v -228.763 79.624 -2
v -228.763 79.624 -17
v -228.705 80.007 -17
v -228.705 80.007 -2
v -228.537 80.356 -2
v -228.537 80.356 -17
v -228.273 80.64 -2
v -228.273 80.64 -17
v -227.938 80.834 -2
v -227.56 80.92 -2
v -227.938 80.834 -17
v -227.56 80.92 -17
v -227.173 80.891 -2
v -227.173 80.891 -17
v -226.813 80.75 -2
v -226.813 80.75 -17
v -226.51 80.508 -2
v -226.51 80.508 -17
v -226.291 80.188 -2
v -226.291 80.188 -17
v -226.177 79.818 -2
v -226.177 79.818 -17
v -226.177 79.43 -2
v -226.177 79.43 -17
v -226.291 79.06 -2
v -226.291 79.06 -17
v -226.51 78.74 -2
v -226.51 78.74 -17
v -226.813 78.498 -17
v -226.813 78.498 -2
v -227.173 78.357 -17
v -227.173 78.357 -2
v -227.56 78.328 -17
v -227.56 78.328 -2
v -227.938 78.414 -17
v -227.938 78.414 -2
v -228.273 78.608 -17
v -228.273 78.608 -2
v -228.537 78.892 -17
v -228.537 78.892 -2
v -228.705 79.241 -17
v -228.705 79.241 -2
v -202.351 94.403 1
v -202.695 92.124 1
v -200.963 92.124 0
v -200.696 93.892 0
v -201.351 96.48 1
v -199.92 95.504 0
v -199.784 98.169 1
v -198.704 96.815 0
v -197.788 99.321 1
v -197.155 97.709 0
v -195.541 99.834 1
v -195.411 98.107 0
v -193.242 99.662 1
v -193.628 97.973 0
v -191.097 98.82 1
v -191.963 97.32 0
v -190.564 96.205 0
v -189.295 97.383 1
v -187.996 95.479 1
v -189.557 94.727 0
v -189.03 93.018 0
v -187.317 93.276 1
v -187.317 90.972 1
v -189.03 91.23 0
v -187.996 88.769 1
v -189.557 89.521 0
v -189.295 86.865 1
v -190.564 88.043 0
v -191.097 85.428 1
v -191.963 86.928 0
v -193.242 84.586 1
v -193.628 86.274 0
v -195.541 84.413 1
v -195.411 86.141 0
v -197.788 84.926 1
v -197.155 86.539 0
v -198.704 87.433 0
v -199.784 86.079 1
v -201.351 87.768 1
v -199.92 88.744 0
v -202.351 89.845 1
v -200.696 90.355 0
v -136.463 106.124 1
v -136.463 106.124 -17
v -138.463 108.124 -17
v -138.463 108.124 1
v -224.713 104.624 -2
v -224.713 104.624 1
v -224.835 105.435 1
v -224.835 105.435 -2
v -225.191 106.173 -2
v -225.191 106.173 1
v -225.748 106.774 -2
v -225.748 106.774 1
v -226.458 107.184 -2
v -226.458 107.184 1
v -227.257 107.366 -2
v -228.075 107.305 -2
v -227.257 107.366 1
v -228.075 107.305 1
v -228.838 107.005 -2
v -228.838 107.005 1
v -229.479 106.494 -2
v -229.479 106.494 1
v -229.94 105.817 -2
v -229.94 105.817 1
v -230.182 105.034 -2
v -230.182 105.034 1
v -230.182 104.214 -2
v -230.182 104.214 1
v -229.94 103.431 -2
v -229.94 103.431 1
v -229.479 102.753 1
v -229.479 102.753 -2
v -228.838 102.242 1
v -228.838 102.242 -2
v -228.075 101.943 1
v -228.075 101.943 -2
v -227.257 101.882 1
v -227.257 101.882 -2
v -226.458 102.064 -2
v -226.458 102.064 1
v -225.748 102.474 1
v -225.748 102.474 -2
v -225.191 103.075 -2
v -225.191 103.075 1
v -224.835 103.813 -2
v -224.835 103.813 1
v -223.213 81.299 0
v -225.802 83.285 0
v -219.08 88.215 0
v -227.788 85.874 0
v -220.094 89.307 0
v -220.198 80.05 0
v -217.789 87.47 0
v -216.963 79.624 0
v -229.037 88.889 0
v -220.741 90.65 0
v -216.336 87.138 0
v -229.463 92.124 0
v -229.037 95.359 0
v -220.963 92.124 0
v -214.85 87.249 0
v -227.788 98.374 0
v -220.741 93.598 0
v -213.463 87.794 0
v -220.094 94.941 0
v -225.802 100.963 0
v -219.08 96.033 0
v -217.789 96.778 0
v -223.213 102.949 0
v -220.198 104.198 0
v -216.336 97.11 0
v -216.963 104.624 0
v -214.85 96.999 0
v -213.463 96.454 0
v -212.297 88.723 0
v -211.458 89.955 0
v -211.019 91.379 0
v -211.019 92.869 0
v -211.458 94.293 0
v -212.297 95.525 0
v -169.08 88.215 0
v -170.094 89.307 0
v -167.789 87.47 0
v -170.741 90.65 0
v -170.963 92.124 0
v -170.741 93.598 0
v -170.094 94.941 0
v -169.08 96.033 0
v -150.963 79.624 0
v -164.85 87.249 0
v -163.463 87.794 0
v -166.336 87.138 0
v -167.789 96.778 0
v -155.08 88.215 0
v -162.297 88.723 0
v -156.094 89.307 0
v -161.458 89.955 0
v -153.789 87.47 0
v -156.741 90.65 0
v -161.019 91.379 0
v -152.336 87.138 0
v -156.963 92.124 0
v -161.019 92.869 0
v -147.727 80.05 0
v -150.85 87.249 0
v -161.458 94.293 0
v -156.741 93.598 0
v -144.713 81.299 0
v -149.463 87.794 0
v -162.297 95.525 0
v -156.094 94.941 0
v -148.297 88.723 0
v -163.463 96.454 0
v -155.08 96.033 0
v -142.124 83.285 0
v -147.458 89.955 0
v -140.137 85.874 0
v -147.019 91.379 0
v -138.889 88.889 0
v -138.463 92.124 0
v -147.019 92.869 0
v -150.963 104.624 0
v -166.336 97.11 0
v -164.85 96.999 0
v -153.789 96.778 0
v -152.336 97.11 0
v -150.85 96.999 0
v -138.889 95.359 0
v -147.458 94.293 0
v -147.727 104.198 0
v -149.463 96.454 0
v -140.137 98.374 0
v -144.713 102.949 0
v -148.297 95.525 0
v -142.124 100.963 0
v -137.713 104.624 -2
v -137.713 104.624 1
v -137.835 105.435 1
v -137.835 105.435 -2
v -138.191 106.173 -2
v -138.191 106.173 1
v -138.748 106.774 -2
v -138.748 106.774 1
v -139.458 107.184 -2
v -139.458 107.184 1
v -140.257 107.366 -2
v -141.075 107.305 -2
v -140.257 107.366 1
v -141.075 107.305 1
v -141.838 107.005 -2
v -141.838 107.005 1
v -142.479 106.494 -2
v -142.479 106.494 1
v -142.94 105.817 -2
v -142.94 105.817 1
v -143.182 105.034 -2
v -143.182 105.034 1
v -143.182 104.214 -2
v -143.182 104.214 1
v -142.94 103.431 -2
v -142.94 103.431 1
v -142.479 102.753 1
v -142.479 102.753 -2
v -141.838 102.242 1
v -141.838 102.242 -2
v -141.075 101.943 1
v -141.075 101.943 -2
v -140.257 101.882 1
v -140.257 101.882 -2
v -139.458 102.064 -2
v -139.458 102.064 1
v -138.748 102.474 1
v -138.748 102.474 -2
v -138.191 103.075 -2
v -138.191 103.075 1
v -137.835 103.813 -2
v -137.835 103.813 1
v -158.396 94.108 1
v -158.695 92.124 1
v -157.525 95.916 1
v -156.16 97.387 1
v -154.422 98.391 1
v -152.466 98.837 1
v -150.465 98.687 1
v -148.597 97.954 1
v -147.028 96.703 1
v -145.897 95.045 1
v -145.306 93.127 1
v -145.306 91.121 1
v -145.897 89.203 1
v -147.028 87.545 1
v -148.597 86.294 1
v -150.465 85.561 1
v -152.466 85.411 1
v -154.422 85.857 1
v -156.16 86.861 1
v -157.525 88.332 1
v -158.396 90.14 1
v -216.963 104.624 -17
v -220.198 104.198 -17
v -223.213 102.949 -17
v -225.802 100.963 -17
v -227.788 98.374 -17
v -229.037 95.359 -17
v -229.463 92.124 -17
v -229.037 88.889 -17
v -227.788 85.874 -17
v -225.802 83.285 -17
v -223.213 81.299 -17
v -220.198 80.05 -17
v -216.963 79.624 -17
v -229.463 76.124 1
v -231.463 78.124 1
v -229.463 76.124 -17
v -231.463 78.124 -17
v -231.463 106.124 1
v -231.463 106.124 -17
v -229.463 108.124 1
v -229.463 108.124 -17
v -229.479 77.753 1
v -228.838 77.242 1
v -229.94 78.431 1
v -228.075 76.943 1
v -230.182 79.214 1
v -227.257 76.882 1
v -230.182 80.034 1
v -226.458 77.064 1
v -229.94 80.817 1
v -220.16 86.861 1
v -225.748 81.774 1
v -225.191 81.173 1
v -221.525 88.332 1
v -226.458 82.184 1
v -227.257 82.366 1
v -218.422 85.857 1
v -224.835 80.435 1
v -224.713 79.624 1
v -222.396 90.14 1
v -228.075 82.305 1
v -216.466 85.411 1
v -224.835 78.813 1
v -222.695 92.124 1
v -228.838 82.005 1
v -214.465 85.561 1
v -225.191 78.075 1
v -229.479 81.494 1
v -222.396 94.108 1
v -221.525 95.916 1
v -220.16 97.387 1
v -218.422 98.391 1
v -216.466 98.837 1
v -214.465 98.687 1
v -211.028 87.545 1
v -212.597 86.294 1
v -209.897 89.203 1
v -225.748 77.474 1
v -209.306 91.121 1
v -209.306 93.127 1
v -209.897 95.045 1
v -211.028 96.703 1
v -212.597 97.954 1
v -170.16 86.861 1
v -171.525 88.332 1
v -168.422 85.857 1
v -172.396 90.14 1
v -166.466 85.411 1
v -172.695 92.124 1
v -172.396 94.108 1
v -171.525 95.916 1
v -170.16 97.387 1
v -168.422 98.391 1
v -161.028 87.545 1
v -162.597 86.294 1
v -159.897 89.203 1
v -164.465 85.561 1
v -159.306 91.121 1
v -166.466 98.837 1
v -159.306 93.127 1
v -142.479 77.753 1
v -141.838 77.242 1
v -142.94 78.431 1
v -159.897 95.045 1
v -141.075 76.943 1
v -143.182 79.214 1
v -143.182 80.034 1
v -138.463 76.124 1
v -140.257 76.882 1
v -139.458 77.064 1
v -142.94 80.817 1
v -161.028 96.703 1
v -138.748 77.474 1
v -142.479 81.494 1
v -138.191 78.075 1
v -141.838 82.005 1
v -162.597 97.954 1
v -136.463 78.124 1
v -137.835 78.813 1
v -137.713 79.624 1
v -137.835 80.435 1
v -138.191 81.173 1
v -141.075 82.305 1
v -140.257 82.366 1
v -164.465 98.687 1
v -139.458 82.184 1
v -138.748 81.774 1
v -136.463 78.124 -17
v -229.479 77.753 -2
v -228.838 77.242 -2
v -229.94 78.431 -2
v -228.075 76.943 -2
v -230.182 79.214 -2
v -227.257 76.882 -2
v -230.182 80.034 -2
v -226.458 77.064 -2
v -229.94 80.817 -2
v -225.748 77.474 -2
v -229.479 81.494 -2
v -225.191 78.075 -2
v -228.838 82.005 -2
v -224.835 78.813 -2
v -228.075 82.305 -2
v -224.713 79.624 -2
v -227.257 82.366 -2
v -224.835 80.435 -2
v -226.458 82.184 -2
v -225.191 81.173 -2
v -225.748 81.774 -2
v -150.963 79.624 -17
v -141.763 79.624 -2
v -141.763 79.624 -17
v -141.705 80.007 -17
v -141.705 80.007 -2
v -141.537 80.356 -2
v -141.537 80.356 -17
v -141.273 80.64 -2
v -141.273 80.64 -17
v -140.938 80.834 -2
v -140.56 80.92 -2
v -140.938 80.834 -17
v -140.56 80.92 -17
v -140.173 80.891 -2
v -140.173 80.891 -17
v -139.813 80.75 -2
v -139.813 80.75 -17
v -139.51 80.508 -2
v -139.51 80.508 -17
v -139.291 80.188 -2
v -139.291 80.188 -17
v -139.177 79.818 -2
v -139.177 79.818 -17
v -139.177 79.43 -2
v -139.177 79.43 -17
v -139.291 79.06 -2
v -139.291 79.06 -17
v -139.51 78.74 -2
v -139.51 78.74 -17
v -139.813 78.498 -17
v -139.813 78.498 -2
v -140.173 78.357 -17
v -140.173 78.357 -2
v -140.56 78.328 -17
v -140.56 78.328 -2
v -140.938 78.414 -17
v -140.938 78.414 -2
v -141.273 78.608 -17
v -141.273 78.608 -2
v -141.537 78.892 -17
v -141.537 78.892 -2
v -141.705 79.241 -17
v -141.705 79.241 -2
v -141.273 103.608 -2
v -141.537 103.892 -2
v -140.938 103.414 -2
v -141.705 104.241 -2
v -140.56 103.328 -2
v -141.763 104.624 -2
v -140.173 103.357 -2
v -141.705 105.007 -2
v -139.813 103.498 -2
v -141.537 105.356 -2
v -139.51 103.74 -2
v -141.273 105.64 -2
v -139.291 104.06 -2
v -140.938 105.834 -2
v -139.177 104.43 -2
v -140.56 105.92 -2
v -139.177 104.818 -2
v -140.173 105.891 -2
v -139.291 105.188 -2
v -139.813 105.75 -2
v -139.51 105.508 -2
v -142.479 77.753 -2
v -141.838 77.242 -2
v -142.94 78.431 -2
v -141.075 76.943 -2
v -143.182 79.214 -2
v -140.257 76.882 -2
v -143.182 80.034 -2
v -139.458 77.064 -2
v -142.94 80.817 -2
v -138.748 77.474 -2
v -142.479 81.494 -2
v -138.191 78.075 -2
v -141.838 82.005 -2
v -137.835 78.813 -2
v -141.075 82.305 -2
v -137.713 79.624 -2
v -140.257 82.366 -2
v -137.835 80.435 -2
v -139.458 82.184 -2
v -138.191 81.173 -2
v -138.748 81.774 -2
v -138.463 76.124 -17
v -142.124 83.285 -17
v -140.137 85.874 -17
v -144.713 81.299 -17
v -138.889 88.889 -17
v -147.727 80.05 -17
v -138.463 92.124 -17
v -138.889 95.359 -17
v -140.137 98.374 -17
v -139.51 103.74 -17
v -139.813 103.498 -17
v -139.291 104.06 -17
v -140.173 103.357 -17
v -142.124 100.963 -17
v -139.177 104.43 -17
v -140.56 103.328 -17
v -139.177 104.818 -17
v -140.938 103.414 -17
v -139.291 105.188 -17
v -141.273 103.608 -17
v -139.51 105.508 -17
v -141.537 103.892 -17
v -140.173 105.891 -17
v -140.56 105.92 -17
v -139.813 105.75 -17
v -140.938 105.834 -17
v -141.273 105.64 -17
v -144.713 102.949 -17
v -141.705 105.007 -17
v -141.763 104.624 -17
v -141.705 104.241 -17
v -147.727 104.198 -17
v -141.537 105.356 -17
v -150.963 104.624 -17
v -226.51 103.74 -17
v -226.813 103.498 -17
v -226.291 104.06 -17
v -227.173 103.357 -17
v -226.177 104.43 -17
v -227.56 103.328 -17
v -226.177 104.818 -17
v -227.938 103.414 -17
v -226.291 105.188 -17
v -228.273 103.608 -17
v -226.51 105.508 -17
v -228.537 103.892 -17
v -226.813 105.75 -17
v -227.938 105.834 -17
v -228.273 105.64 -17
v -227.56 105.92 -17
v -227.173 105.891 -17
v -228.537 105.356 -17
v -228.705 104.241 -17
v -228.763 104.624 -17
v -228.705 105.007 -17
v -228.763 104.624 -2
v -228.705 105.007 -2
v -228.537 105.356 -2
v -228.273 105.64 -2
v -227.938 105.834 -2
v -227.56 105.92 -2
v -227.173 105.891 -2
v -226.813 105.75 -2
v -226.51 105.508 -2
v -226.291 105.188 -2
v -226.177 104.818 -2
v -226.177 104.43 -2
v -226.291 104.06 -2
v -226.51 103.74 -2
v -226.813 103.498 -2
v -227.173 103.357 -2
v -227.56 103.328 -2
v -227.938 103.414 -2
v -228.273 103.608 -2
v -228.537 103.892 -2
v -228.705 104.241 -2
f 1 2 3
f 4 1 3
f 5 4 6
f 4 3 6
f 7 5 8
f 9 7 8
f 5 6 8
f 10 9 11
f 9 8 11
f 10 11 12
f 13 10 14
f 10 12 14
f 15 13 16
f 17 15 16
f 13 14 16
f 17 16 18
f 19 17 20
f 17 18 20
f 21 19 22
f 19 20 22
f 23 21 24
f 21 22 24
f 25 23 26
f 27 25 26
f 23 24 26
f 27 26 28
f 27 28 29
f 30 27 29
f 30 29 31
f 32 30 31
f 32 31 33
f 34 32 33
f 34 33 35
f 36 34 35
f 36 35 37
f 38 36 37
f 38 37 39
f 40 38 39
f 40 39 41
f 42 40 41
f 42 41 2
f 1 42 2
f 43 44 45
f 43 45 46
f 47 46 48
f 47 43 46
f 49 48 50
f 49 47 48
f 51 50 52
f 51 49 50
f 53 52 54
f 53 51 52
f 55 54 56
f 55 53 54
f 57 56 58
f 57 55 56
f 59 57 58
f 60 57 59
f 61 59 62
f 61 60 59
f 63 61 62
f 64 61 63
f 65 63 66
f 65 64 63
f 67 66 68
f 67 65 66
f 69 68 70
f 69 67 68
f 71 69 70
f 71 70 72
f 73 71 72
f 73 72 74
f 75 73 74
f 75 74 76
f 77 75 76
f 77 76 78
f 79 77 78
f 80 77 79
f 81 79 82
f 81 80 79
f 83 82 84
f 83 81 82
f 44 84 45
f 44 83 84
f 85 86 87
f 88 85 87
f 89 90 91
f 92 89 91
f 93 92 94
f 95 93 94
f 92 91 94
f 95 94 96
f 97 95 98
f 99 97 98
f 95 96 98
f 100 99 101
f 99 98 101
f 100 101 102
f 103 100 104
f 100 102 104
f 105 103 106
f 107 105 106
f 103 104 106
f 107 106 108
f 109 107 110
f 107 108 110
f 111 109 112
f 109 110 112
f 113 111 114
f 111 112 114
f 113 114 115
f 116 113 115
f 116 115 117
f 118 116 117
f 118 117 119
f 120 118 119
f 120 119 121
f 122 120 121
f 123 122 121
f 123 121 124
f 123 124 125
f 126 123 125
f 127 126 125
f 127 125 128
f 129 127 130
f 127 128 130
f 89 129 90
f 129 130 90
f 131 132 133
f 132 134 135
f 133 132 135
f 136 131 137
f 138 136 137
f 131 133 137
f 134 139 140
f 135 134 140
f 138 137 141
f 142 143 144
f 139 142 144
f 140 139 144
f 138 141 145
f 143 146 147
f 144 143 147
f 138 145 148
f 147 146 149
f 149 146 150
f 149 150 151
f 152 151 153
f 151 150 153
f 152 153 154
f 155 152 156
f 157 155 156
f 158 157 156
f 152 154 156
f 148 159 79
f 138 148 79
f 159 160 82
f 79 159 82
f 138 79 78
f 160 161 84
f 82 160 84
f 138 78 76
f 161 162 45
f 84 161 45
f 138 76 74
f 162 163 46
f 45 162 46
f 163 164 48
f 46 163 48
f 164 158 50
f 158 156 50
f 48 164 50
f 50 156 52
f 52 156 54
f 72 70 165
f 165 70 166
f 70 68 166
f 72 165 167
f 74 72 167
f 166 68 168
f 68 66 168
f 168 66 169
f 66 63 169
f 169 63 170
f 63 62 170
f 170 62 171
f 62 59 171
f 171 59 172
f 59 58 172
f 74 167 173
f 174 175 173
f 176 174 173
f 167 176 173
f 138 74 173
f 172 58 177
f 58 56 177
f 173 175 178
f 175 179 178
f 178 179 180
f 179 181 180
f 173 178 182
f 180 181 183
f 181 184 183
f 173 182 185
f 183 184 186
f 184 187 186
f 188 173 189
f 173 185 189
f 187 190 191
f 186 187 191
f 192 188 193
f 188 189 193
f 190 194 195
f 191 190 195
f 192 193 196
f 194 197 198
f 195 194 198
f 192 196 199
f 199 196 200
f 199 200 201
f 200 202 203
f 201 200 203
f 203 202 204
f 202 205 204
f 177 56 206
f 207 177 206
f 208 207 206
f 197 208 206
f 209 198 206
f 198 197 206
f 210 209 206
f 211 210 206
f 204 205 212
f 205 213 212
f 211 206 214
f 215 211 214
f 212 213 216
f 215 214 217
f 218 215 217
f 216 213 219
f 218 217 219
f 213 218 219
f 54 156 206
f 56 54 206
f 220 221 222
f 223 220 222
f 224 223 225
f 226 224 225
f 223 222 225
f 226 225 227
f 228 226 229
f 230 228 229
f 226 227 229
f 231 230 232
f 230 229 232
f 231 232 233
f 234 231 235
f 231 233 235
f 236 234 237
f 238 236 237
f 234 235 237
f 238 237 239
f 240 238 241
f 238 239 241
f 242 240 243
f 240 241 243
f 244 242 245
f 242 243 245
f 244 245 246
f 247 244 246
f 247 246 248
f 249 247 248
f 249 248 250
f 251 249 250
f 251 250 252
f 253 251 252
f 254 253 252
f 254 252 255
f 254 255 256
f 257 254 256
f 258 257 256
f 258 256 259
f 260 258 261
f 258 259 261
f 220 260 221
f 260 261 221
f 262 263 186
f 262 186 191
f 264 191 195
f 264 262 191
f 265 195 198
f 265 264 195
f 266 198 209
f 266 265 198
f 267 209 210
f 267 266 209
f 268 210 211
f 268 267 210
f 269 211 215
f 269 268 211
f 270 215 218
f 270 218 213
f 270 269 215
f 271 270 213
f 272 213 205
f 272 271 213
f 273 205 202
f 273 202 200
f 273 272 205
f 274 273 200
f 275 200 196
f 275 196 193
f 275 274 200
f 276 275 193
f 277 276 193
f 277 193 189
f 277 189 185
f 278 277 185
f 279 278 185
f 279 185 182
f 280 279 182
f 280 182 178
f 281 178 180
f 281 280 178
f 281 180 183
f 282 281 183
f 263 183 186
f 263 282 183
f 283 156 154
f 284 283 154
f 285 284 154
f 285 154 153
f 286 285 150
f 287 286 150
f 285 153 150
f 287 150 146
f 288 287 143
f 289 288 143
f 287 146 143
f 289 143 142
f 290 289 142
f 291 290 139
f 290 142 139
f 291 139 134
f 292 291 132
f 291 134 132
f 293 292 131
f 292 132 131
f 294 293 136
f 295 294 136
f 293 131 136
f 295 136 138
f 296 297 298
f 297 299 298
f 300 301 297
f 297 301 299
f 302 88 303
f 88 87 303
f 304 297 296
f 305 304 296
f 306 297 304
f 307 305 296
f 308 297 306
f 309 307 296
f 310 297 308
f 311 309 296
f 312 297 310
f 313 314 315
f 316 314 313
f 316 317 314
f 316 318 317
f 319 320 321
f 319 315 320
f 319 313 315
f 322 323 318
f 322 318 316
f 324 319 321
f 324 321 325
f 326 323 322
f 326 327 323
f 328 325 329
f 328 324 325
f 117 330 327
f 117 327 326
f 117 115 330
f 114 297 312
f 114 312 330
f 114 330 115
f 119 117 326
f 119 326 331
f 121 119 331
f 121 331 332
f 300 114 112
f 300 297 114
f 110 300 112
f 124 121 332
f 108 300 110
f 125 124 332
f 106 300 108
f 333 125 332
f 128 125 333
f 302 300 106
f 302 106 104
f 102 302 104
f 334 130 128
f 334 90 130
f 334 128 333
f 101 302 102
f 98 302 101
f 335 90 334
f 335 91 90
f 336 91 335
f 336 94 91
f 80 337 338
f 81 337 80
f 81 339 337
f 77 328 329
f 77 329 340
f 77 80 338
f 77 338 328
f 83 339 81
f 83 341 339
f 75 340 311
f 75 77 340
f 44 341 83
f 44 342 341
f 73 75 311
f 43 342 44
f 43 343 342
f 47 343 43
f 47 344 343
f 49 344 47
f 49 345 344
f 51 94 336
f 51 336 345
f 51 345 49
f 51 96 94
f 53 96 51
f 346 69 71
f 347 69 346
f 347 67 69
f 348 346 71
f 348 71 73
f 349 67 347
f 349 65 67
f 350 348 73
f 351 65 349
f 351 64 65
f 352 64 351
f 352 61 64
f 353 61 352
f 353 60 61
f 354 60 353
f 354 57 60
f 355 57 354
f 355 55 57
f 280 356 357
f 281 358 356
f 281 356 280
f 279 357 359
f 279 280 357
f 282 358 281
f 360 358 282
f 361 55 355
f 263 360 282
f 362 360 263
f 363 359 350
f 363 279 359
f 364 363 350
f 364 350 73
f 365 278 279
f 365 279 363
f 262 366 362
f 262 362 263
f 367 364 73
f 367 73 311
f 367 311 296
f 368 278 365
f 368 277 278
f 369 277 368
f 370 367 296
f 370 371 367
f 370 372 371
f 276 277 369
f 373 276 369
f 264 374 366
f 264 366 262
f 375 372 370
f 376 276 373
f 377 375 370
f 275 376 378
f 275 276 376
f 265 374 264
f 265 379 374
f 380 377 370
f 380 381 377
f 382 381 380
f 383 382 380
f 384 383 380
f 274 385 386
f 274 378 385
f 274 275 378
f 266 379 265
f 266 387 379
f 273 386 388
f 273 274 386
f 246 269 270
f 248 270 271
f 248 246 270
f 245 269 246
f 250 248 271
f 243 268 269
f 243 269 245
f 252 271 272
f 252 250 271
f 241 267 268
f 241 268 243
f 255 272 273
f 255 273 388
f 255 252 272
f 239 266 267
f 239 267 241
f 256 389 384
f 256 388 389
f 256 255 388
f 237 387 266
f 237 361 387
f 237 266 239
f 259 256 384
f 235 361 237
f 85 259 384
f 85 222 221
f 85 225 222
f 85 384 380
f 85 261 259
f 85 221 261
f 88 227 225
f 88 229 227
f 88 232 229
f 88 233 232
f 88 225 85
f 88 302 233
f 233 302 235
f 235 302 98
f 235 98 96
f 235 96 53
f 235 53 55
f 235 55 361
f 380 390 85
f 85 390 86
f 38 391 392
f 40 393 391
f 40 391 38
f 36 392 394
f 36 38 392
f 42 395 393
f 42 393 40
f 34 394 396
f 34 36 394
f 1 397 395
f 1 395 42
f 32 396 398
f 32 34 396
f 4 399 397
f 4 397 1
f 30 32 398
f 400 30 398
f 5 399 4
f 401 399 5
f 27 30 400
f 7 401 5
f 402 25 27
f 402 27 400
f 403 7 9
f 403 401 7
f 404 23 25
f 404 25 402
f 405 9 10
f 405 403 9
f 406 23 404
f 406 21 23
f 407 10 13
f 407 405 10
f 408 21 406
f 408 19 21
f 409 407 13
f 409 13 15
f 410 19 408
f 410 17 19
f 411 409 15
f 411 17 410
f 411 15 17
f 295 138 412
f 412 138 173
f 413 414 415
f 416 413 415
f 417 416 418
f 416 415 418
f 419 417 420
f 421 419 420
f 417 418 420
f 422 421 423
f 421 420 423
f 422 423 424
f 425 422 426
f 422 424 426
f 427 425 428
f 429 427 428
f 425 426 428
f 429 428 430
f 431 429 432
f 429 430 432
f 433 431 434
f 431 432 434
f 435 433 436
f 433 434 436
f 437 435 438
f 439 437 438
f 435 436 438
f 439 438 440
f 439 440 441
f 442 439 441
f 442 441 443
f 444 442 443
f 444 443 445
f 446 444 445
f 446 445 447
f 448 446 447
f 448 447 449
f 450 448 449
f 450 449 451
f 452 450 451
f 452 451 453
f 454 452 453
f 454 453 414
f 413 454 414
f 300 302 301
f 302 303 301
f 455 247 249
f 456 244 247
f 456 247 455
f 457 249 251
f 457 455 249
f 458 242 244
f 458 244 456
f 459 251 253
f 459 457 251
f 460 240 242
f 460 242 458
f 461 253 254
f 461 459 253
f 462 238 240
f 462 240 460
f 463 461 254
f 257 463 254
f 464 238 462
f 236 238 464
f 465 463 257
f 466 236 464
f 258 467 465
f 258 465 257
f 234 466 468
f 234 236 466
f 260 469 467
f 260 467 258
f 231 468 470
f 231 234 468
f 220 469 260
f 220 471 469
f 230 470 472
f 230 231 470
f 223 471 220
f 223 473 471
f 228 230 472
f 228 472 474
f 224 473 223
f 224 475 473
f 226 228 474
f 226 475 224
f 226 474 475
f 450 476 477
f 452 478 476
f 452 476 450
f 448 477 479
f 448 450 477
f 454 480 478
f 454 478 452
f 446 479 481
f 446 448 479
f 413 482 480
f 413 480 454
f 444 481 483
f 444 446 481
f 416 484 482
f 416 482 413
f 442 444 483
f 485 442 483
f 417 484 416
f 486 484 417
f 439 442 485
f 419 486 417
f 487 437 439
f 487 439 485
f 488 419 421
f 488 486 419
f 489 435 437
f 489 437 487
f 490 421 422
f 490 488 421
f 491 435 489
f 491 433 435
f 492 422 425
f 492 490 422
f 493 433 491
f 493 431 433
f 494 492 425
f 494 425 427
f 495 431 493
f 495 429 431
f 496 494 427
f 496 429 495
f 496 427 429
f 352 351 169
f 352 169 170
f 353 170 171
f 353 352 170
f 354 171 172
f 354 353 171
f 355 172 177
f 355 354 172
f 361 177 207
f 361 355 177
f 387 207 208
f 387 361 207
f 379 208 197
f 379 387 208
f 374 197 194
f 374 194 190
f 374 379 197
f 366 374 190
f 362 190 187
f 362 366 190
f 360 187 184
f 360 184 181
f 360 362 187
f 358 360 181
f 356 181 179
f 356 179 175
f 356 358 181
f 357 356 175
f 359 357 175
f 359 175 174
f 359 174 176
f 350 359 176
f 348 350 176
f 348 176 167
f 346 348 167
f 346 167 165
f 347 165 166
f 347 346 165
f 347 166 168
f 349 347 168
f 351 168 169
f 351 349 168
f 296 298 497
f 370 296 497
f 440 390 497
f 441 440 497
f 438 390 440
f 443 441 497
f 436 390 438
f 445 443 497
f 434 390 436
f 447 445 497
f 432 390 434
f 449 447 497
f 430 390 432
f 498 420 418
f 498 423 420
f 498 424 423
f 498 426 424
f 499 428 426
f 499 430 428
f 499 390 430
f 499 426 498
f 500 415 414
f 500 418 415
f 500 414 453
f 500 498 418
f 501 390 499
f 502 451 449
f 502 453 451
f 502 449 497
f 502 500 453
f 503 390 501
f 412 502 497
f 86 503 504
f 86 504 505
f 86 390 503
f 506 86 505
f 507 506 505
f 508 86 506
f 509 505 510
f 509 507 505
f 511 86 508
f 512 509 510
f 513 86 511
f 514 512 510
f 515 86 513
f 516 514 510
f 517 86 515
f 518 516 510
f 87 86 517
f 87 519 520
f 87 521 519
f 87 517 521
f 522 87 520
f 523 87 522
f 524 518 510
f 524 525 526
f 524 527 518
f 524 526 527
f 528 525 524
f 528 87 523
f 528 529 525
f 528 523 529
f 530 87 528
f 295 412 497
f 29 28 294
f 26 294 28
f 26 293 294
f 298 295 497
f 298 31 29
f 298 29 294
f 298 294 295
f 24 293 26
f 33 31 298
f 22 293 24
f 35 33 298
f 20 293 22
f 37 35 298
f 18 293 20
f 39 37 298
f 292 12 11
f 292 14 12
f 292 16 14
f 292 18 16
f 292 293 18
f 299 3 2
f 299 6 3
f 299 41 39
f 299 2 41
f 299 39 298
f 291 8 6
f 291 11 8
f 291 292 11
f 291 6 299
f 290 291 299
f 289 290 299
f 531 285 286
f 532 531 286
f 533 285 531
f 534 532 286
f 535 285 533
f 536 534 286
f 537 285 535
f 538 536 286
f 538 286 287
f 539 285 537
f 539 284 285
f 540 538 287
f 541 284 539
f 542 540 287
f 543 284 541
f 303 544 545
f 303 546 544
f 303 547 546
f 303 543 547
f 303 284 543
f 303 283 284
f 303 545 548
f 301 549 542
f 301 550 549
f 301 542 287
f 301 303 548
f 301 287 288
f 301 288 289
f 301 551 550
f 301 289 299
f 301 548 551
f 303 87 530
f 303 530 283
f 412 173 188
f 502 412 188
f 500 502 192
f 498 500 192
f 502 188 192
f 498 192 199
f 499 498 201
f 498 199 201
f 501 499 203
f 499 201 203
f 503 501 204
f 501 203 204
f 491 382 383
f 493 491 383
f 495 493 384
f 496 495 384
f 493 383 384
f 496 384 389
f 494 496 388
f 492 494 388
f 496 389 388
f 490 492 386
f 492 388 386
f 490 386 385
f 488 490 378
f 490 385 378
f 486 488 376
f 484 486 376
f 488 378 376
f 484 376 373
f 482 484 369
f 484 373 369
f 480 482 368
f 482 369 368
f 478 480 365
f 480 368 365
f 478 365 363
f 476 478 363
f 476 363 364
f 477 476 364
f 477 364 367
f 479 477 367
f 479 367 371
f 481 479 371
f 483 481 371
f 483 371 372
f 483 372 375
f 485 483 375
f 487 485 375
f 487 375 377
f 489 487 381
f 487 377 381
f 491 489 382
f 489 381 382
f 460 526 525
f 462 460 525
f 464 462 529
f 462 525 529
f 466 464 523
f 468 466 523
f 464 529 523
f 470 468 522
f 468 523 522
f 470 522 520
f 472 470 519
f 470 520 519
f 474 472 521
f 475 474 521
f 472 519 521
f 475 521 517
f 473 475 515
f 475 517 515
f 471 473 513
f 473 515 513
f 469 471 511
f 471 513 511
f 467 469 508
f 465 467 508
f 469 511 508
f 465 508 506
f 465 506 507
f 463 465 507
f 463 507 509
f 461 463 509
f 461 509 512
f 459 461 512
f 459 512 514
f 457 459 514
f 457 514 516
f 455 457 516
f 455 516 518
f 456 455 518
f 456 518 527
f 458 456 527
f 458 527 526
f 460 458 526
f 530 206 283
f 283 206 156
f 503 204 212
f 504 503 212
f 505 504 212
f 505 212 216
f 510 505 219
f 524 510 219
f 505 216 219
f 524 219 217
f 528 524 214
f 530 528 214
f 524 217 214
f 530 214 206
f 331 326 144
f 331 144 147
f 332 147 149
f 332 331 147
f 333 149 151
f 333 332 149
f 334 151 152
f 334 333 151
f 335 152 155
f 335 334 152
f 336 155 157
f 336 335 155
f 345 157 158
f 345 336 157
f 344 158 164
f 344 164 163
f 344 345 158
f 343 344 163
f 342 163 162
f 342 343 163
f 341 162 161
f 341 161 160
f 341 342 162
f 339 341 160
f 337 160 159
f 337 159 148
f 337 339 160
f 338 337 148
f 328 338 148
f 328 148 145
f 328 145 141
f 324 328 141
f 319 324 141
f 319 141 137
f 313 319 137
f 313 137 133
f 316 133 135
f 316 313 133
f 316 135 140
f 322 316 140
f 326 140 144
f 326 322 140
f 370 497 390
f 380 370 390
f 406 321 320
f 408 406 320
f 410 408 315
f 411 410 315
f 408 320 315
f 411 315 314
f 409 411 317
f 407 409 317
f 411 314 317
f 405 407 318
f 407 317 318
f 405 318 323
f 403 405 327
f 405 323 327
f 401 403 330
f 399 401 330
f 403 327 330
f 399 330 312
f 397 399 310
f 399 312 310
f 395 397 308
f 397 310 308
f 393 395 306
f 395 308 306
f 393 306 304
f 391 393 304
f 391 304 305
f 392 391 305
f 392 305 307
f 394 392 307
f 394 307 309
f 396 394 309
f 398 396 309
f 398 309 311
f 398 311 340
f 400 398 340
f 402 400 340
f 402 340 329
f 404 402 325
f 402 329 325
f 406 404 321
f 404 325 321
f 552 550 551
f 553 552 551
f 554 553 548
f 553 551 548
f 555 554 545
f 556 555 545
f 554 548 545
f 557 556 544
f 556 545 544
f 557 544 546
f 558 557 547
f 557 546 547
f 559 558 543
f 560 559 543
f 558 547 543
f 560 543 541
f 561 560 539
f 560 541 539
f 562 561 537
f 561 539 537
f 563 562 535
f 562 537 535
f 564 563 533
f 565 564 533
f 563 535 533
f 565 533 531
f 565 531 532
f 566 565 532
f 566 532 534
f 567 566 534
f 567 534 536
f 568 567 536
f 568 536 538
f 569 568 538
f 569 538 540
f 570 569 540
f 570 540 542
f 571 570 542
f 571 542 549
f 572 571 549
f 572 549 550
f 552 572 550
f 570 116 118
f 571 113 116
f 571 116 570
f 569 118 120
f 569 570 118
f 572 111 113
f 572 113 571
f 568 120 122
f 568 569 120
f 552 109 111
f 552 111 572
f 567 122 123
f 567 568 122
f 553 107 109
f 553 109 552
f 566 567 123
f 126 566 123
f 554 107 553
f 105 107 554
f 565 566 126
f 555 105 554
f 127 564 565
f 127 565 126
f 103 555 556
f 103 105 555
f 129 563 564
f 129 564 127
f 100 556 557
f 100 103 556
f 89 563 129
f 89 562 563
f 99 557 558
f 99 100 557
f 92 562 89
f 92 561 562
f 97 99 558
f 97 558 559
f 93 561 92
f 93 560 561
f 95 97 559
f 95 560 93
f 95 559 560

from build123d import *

# Parameters (mm, degrees)
EXTRUDE_1_DEPTH     = 17
SKETCH_2_R          = 6
SKETCH_2_R_2        = 5
EXTRUDE_2_DEPTH     = 1
SKETCH_3_R          = 5
SKETCH_3_R_2        = 6
CUT_EXTRUDE_1_DEPTH = 11
CUT_EXTRUDE_1_TAPER = -60
EXTRUDE_5_DEPTH     = 17
SKETCH_9_R          = 1.3
CUT_EXTRUDE_6_DEPTH = 19.0000001
SKETCH_10_R         = 2.75
CUT_EXTRUDE_7_DEPTH = 3


with BuildPart() as part:
    # 草图1 → 凸台-拉伸1 (new body)
    with BuildSketch(Plane.XY):
        Polygon((-229.462722424, 108.123928313), (-138.462722424, 108.123928313), (-136.462722424, 106.123928313), (-136.462722424, 78.123928313), (-138.462722424, 76.123928313), (-229.462722424, 76.123928313), (-231.462722424, 78.123928313), (-231.462722424, 106.123928313), align=None)
        Polygon((-228.6342953, 106.123928313), (-139.291149549, 106.123928313), (-138.462722424, 105.295501188), (-138.462722424, 78.952355437), (-139.291149549, 78.123928313), (-228.6342953, 78.123928313), (-229.462722424, 78.952355437), (-229.462722424, 105.295501188), align=None, mode=Mode.SUBTRACT)
    extrude(amount=-EXTRUDE_1_DEPTH)

    # 草图2 → 凸台-拉伸2 (add)
    with BuildSketch(Plane.XY):
        Polygon((-136.462722424, 106.123928313), (-138.462722424, 108.123928313), (-229.462722424, 108.123928313), (-231.462722424, 106.123928313), (-231.462722424, 78.123928313), (-229.462722424, 76.123928313), (-138.462722424, 76.123928313), (-136.462722424, 78.123928313), align=None)
        with Locations((-194.962722424, 92.123928313)):
            Circle(SKETCH_2_R, mode=Mode.SUBTRACT)
        with Locations((-165.962722424, 92.123928313)):
            Circle(SKETCH_2_R_2, mode=Mode.SUBTRACT)
        with Locations((-215.962722424, 92.123928313)):
            Circle(SKETCH_2_R_2, mode=Mode.SUBTRACT)
        with Locations((-151.962722424, 92.123928313)):
            Circle(SKETCH_2_R_2, mode=Mode.SUBTRACT)
    extrude(amount=EXTRUDE_2_DEPTH)

    # 草图3 → 切除-拉伸1 (cut)
    with BuildSketch(Plane(origin=(0, 0, 0), x_dir=(-1, 0, 0), z_dir=(0, 0, -1))):
        with Locations((151.962722424, 92.123928313)):
            Circle(SKETCH_3_R)
        with Locations((215.962722424, 92.123928313)):
            Circle(SKETCH_3_R)
        with Locations((194.962722424, 92.123928313)):
            Circle(SKETCH_3_R_2)
        with Locations((165.962722424, 92.123928313)):
            Circle(SKETCH_3_R)
    extrude(amount=-CUT_EXTRUDE_1_DEPTH, taper=CUT_EXTRUDE_1_TAPER, mode=Mode.SUBTRACT)

    # 草图8 → 凸台-拉伸5 (add)
    with BuildSketch(Plane(origin=(0, 0, 0), x_dir=(-1, 0, 0), z_dir=(0, 0, -1))):
        with BuildLine():
            ThreePointArc((229.462722424, 92.123928313), (225.801557189, 83.285093548), (216.962722424, 79.623928313))
            Line((216.962722424, 79.623928313), (150.962722424, 79.623928313))
            ThreePointArc((150.962722424, 79.623928313), (142.123887659, 83.285093548), (138.462722424, 92.123928313))
            Line((138.462722424, 92.123928313), (138.462722424, 78.952355437))
            Line((138.462722424, 78.952355437), (139.291149549, 78.123928313))
            Line((139.291149549, 78.123928313), (228.6342953, 78.123928313))
            Line((228.6342953, 78.123928313), (229.462722424, 78.952355437))
            Line((229.462722424, 78.952355437), (229.462722424, 92.123928313))
        make_face()
        with BuildLine():
            ThreePointArc((216.962722424, 104.623928313), (225.801557189, 100.962763077), (229.462722424, 92.123928313))
            Line((229.462722424, 92.123928313), (229.462722424, 105.295501188))
            Line((229.462722424, 105.295501188), (228.6342953, 106.123928313))
            Line((228.6342953, 106.123928313), (139.291149549, 106.123928313))
            Line((139.291149549, 106.123928313), (138.462722424, 105.295501188))
            Line((138.462722424, 105.295501188), (138.462722424, 92.123928313))
            ThreePointArc((138.462722424, 92.123928313), (142.123887659, 100.962763077), (150.962722424, 104.623928313))
            Line((150.962722424, 104.623928313), (216.962722424, 104.623928313))
        make_face()
    extrude(amount=EXTRUDE_5_DEPTH)

    # 草图9 → 切除-拉伸6 (cut, through all)
    with BuildSketch(Plane(origin=(0, 0, -17), x_dir=(-1, 0, 0), z_dir=(0, 0, -1))):
        with Locations((227.462722424, 79.623928313)):
            Circle(SKETCH_9_R)
        with Locations((227.462722424, 104.623928313)):
            Circle(SKETCH_9_R)
        with Locations((140.462722424, 79.623928313)):
            Circle(SKETCH_9_R)
        with Locations((140.462722424, 104.623928313)):
            Circle(SKETCH_9_R)
    extrude(amount=-CUT_EXTRUDE_6_DEPTH, mode=Mode.SUBTRACT)

    # 草图10 → 切除-拉伸7 (cut)
    with BuildSketch(Plane.XY.offset(1)):
        with Locations((-227.462722424, 104.623928313)):
            Circle(SKETCH_10_R)
        with Locations((-140.462722424, 104.623928313)):
            Circle(SKETCH_10_R)
        with Locations((-227.462722424, 79.623928313)):
            Circle(SKETCH_10_R)
        with Locations((-140.462722424, 79.623928313)):
            Circle(SKETCH_10_R)
    extrude(amount=-CUT_EXTRUDE_7_DEPTH, mode=Mode.SUBTRACT)


solid = part.part
